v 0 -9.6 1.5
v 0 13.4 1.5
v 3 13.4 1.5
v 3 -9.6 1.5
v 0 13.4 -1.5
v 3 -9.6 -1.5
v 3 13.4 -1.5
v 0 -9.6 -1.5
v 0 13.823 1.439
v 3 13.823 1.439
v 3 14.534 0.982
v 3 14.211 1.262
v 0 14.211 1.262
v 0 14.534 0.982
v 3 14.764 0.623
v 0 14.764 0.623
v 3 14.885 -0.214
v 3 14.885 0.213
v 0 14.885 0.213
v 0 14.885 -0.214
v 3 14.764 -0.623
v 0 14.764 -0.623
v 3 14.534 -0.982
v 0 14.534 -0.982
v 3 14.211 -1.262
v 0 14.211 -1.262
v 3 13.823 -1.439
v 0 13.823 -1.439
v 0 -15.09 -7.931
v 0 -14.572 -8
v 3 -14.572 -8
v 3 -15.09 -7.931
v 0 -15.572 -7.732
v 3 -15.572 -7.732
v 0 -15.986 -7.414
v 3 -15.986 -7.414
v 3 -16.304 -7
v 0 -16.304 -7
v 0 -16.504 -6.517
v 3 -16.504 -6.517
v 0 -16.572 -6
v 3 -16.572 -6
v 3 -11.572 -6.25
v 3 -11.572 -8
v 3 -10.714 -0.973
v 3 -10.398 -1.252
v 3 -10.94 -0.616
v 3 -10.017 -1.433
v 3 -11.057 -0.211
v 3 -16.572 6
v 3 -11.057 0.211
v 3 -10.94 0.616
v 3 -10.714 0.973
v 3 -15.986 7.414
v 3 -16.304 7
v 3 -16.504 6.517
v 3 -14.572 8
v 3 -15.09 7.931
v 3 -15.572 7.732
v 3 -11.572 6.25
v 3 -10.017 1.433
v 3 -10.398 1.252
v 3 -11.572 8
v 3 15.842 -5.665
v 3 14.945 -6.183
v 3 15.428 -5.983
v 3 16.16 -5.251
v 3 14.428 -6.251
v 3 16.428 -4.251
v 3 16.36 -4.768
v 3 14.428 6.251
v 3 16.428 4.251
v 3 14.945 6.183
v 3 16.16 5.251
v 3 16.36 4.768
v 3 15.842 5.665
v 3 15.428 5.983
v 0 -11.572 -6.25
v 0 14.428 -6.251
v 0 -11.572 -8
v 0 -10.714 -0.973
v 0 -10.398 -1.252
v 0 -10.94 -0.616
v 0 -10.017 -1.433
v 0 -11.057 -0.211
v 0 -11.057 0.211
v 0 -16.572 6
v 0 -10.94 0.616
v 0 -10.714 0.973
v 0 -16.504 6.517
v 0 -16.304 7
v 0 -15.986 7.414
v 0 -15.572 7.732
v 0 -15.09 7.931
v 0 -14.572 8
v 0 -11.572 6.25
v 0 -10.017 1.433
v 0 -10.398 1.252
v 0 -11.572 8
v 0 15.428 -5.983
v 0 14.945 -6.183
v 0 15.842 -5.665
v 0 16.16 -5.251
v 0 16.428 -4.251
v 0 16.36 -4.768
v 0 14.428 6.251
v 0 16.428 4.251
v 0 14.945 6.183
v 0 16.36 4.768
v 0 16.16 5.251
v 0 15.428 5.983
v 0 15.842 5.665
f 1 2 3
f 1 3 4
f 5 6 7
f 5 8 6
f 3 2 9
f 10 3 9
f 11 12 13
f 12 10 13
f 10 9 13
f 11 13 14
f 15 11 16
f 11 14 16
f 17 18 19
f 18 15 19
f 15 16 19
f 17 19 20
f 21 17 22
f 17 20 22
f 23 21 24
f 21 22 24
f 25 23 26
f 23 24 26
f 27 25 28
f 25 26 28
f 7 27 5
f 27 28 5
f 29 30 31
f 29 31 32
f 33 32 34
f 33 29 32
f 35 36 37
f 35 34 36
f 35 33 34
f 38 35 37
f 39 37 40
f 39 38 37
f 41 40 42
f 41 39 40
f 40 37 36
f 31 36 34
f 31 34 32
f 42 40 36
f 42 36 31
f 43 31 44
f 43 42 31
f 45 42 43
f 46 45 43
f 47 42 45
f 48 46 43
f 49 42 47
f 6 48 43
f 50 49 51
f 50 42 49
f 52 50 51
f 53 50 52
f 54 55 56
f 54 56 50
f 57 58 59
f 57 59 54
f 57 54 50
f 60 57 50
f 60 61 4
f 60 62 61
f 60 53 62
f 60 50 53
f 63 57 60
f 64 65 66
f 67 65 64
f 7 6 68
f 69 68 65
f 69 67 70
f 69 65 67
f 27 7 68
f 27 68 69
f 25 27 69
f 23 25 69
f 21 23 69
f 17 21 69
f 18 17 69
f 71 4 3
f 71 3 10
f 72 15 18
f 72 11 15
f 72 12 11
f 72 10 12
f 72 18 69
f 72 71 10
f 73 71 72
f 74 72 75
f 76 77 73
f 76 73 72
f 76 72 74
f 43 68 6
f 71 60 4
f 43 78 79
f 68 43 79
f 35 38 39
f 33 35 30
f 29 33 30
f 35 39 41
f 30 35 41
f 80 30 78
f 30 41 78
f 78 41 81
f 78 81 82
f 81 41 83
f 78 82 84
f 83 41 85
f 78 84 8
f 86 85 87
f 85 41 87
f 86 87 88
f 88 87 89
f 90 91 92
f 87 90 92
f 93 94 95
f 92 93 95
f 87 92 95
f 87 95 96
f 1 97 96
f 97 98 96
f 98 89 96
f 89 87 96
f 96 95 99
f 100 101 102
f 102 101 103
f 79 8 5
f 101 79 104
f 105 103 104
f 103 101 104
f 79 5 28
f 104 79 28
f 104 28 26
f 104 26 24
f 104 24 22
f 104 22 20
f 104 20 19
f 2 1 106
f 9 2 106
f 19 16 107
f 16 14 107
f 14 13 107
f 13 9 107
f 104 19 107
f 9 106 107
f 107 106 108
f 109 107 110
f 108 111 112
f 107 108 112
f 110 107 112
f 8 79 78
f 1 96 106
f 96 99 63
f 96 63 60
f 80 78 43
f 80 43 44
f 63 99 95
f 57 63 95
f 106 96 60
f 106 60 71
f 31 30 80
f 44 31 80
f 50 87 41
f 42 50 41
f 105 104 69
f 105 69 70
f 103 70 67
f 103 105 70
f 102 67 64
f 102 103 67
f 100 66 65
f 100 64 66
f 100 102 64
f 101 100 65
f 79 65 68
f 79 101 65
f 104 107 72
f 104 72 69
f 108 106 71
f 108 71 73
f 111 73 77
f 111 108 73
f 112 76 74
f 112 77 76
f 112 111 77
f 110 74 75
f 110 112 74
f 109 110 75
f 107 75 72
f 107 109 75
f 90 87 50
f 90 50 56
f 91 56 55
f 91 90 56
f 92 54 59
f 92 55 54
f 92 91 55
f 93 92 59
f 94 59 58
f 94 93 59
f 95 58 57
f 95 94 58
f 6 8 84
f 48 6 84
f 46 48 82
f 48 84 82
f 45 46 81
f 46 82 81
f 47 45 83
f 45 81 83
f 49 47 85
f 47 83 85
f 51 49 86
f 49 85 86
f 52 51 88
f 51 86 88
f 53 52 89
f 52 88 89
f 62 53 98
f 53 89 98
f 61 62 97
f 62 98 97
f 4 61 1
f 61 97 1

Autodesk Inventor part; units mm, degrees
ref_plane "YZ Plane" through (0, 0, 0) normal (1, 0, 0) x (0, 1, 0)
ref_plane "XZ Plane" through (0, 0, 0) normal (0, 1, 0) x (-1, 0, 0)
ref_plane "XY Plane" through (0, 0, 0) normal (0, 0, 1) x (1, 0, 0)
sketch "Sketch1" plane through (0, 0, 0) normal (1, 0, 0) x (0, 1, 0)
  line L0 (-11.5722, 7.9995) -> (-14.5722, 7.9995)
  line L1 (-16.5722, 5.9995) -> (-16.5722, -5.9996)
  line L2 (-14.5722, -7.9996) -> (-11.5722, -7.9996)
  line L3 (16.4278, 8.0004) -> (-16.5722, -7.9996) construction
  line L4 (-11.5722, 7.9995) -> (-11.5722, 6.2495)
  line L5 (-11.5722, 6.2495) -> (14.4277, 6.2507)
  line L6 (-11.5722, -6.2496) -> (14.4277, -6.2508)
  line L7 (-11.5722, 7.9995) -> (-11.5722, 6.2495)
  line L8 (-11.5722, -6.2496) -> (-11.5722, -7.9996)
  arc A0 (-14.5722, 7.9995) -> (-16.5722, 5.9995) centre (-14.5722, 5.9995) ccw
  arc A1 (-16.5722, -5.9996) -> (-14.5722, -7.9996) centre (-14.5722, -5.9996) ccw
  line L9 (-16.5722, 7.9995) -> (-3.1229, 1.4787) construction
  line L10 (-2.3653, 1.1122) -> (16.4278, -7.9996) construction
  arc A2 (13.4, -1.5001) -> (13.4, 1.4999) centre (13.4, -0.0001) ccw
  arc A3 (-9.6, 1.4999) -> (-9.6, -1.4996) centre (-9.5722, 0.0001) ccw
  line L11 (13.4, 1.4999) -> (-9.6, 1.4999)
  line L12 (-9.6, -1.4996) -> (13.4, -1.5001)
  line L13 (16.4278, 4.2507) -> (16.4278, -4.2508)
  arc A4 (16.4278, 4.2507) -> (14.4277, 6.2507) centre (14.4278, 4.2507) ccw
  arc A5 (14.4277, -6.2508) -> (16.4278, -4.2508) centre (14.4278, -4.2508) ccw
  point P0 (16.4278, 6.2508)
  point P1 (16.4278, -6.2509)
  dimension "d1" = 16
  dimension "d3" = 1.75
  dimension "d5" = 2
  dimension "d14" = 1.75
  dimension "d18" = 3
  dimension "d19" = 3
  dimension "d21" = 2
  dimension "d24" = 28
  dimension "d25" = 2
  dimension "d26" = 5
extrude "Extrusion3" add sketch "Sketch1" along normal blind 3
properties part number "Ga motor 1"
